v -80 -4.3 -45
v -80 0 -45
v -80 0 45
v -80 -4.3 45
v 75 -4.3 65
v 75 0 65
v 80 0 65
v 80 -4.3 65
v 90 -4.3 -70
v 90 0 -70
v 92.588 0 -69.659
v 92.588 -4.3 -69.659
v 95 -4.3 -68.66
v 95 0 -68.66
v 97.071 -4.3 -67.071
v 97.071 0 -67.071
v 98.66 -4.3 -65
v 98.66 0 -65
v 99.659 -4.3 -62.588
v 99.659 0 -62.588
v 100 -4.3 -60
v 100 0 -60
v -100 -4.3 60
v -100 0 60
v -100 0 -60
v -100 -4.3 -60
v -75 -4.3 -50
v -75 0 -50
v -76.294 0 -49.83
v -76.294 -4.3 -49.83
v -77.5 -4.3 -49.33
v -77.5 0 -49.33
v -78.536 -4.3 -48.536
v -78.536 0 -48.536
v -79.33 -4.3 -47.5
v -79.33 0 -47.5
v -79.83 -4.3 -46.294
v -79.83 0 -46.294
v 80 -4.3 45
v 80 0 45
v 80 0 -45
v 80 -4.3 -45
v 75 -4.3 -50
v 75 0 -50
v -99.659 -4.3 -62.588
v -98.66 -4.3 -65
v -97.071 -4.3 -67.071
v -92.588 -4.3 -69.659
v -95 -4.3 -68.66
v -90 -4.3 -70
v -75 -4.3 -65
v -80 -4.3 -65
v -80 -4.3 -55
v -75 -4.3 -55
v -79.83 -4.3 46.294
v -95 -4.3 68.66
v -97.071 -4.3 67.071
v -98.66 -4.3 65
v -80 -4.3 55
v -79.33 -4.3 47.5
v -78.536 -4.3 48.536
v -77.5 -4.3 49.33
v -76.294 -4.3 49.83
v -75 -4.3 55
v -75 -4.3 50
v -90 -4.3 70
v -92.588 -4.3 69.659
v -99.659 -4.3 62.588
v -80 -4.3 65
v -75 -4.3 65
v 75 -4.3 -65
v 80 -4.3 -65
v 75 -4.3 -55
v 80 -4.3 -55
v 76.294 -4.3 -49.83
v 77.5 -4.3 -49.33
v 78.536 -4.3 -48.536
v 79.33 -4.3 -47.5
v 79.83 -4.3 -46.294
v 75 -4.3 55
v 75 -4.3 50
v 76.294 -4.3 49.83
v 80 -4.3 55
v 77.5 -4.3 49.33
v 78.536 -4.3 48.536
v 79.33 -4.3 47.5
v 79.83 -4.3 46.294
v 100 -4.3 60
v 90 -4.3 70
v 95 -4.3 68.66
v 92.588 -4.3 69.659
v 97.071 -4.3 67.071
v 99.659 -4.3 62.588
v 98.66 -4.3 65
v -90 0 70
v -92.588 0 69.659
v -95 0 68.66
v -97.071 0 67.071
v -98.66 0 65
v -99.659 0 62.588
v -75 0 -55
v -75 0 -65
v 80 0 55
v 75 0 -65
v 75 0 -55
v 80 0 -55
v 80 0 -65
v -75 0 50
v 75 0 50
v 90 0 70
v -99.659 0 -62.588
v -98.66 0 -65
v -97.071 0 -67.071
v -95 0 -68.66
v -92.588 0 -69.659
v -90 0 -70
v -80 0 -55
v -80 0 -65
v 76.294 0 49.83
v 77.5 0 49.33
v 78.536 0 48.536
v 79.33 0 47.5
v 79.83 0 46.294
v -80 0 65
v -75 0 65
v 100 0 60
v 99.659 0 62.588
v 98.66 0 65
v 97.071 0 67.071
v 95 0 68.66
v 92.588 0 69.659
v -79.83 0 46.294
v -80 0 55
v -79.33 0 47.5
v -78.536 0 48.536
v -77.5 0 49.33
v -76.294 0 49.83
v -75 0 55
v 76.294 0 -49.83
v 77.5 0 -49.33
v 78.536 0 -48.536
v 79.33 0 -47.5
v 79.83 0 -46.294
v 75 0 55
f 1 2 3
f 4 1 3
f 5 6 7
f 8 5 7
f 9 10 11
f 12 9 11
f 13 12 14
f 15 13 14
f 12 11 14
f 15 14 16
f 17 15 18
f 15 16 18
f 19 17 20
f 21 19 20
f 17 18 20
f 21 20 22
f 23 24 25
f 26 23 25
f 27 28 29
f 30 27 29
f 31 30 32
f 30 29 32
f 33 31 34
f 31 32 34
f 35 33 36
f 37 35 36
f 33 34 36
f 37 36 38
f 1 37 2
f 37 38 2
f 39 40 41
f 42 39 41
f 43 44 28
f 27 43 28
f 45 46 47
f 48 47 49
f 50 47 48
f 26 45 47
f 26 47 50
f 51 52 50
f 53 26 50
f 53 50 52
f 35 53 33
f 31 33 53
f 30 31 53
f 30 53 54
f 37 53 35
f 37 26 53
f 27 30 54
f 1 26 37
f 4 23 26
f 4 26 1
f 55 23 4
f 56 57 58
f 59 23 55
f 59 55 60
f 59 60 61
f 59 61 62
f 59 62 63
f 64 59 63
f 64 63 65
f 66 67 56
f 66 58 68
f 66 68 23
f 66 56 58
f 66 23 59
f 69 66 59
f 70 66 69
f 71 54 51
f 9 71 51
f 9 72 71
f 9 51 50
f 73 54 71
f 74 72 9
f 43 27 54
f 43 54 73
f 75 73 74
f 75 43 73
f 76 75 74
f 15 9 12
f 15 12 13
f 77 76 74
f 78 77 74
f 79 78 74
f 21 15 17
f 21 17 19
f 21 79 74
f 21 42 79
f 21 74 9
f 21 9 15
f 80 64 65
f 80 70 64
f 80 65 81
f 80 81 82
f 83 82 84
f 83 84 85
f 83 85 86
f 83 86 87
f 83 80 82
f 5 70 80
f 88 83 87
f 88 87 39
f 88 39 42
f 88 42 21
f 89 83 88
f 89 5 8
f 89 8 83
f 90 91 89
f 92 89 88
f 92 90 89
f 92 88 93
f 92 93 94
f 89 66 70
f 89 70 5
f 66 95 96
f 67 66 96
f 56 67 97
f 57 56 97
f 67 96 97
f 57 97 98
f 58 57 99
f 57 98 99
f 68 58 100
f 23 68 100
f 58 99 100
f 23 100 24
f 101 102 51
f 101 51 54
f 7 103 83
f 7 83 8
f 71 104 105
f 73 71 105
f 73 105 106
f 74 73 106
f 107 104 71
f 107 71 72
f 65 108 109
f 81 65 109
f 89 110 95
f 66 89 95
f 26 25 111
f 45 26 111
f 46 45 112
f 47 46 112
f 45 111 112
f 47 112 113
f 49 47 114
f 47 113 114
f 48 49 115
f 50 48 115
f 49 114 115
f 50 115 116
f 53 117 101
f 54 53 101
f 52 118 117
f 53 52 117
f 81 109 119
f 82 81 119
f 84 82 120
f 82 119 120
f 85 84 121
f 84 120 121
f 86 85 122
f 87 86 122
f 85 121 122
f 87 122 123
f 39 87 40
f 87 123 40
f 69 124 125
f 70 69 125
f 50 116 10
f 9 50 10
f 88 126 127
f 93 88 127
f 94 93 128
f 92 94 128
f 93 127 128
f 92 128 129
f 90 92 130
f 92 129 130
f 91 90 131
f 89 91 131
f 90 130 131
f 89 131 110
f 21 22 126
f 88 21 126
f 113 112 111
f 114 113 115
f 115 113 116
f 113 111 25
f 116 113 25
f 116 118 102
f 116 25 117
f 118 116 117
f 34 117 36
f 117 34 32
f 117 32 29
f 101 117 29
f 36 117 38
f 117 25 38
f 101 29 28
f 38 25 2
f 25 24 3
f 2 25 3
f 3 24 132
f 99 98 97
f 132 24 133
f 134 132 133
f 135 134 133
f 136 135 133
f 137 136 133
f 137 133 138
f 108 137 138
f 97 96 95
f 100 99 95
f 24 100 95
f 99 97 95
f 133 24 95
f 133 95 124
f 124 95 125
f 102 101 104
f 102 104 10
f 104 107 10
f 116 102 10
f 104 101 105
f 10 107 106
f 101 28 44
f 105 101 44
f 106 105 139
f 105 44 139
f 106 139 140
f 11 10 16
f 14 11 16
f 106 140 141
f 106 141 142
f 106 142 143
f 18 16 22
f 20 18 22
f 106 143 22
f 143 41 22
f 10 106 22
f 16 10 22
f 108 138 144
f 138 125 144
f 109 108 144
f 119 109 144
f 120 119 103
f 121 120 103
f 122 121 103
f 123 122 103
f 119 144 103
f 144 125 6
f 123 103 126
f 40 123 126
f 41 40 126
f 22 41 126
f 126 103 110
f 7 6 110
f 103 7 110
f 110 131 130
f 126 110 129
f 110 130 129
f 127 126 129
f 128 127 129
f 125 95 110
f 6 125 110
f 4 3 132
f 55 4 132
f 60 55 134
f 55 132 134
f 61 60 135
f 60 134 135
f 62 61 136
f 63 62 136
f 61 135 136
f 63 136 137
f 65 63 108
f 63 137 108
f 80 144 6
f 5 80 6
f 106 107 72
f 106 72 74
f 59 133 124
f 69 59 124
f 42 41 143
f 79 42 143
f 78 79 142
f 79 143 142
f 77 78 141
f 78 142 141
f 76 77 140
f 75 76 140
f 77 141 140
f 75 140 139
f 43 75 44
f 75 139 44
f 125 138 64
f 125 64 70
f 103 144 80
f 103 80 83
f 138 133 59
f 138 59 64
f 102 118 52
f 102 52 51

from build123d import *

# Parameters (mm, degrees)
F0_W     = 5
F0_H     = 10
F1_DEPTH = 4.3


with BuildPart() as f1:
    # F0 (on Front) → F1 (new body)
    with BuildSketch(Plane.XZ):
        with BuildLine():
            Line((90, 70), (-90, 70))
            ThreePointArc((-90, 70), (-97.071068, 67.071068), (-100, 60))
            Line((-100, 60), (-100, -60))
            ThreePointArc((-100, -60), (-97.071068, -67.071068), (-90, -70))
            Line((-90, -70), (90, -70))
            ThreePointArc((90, -70), (97.071068, -67.071068), (100, -60))
            Line((100, -60), (100, 60))
            ThreePointArc((100, 60), (97.071068, 67.071068), (90, 70))
        make_face()
        with Locations((-77.5, -60)):
            Rectangle(F0_W, F0_H, mode=Mode.SUBTRACT)
        with Locations((77.5, -60)):
            Rectangle(F0_W, F0_H, mode=Mode.SUBTRACT)
        with Locations((-77.5, 60)):
            Rectangle(F0_W, F0_H, mode=Mode.SUBTRACT)
        with BuildLine():
            ThreePointArc((-80, 45), (-78.535534, 48.535534), (-75, 50))
            Line((-75, 50), (75, 50))
            ThreePointArc((75, 50), (78.535534, 48.535534), (80, 45))
            Line((80, 45), (80, -45))
            ThreePointArc((80, -45), (78.535534, -48.535534), (75, -50))
            Line((75, -50), (-75, -50))
            ThreePointArc((-75, -50), (-78.535534, -48.535534), (-80, -45))
            Line((-80, -45), (-80, 45))
        make_face(mode=Mode.SUBTRACT)
        with Locations((77.5, 60)):
            Rectangle(F0_W, F0_H, mode=Mode.SUBTRACT)
    extrude(amount=F1_DEPTH)


solid = f1.part
